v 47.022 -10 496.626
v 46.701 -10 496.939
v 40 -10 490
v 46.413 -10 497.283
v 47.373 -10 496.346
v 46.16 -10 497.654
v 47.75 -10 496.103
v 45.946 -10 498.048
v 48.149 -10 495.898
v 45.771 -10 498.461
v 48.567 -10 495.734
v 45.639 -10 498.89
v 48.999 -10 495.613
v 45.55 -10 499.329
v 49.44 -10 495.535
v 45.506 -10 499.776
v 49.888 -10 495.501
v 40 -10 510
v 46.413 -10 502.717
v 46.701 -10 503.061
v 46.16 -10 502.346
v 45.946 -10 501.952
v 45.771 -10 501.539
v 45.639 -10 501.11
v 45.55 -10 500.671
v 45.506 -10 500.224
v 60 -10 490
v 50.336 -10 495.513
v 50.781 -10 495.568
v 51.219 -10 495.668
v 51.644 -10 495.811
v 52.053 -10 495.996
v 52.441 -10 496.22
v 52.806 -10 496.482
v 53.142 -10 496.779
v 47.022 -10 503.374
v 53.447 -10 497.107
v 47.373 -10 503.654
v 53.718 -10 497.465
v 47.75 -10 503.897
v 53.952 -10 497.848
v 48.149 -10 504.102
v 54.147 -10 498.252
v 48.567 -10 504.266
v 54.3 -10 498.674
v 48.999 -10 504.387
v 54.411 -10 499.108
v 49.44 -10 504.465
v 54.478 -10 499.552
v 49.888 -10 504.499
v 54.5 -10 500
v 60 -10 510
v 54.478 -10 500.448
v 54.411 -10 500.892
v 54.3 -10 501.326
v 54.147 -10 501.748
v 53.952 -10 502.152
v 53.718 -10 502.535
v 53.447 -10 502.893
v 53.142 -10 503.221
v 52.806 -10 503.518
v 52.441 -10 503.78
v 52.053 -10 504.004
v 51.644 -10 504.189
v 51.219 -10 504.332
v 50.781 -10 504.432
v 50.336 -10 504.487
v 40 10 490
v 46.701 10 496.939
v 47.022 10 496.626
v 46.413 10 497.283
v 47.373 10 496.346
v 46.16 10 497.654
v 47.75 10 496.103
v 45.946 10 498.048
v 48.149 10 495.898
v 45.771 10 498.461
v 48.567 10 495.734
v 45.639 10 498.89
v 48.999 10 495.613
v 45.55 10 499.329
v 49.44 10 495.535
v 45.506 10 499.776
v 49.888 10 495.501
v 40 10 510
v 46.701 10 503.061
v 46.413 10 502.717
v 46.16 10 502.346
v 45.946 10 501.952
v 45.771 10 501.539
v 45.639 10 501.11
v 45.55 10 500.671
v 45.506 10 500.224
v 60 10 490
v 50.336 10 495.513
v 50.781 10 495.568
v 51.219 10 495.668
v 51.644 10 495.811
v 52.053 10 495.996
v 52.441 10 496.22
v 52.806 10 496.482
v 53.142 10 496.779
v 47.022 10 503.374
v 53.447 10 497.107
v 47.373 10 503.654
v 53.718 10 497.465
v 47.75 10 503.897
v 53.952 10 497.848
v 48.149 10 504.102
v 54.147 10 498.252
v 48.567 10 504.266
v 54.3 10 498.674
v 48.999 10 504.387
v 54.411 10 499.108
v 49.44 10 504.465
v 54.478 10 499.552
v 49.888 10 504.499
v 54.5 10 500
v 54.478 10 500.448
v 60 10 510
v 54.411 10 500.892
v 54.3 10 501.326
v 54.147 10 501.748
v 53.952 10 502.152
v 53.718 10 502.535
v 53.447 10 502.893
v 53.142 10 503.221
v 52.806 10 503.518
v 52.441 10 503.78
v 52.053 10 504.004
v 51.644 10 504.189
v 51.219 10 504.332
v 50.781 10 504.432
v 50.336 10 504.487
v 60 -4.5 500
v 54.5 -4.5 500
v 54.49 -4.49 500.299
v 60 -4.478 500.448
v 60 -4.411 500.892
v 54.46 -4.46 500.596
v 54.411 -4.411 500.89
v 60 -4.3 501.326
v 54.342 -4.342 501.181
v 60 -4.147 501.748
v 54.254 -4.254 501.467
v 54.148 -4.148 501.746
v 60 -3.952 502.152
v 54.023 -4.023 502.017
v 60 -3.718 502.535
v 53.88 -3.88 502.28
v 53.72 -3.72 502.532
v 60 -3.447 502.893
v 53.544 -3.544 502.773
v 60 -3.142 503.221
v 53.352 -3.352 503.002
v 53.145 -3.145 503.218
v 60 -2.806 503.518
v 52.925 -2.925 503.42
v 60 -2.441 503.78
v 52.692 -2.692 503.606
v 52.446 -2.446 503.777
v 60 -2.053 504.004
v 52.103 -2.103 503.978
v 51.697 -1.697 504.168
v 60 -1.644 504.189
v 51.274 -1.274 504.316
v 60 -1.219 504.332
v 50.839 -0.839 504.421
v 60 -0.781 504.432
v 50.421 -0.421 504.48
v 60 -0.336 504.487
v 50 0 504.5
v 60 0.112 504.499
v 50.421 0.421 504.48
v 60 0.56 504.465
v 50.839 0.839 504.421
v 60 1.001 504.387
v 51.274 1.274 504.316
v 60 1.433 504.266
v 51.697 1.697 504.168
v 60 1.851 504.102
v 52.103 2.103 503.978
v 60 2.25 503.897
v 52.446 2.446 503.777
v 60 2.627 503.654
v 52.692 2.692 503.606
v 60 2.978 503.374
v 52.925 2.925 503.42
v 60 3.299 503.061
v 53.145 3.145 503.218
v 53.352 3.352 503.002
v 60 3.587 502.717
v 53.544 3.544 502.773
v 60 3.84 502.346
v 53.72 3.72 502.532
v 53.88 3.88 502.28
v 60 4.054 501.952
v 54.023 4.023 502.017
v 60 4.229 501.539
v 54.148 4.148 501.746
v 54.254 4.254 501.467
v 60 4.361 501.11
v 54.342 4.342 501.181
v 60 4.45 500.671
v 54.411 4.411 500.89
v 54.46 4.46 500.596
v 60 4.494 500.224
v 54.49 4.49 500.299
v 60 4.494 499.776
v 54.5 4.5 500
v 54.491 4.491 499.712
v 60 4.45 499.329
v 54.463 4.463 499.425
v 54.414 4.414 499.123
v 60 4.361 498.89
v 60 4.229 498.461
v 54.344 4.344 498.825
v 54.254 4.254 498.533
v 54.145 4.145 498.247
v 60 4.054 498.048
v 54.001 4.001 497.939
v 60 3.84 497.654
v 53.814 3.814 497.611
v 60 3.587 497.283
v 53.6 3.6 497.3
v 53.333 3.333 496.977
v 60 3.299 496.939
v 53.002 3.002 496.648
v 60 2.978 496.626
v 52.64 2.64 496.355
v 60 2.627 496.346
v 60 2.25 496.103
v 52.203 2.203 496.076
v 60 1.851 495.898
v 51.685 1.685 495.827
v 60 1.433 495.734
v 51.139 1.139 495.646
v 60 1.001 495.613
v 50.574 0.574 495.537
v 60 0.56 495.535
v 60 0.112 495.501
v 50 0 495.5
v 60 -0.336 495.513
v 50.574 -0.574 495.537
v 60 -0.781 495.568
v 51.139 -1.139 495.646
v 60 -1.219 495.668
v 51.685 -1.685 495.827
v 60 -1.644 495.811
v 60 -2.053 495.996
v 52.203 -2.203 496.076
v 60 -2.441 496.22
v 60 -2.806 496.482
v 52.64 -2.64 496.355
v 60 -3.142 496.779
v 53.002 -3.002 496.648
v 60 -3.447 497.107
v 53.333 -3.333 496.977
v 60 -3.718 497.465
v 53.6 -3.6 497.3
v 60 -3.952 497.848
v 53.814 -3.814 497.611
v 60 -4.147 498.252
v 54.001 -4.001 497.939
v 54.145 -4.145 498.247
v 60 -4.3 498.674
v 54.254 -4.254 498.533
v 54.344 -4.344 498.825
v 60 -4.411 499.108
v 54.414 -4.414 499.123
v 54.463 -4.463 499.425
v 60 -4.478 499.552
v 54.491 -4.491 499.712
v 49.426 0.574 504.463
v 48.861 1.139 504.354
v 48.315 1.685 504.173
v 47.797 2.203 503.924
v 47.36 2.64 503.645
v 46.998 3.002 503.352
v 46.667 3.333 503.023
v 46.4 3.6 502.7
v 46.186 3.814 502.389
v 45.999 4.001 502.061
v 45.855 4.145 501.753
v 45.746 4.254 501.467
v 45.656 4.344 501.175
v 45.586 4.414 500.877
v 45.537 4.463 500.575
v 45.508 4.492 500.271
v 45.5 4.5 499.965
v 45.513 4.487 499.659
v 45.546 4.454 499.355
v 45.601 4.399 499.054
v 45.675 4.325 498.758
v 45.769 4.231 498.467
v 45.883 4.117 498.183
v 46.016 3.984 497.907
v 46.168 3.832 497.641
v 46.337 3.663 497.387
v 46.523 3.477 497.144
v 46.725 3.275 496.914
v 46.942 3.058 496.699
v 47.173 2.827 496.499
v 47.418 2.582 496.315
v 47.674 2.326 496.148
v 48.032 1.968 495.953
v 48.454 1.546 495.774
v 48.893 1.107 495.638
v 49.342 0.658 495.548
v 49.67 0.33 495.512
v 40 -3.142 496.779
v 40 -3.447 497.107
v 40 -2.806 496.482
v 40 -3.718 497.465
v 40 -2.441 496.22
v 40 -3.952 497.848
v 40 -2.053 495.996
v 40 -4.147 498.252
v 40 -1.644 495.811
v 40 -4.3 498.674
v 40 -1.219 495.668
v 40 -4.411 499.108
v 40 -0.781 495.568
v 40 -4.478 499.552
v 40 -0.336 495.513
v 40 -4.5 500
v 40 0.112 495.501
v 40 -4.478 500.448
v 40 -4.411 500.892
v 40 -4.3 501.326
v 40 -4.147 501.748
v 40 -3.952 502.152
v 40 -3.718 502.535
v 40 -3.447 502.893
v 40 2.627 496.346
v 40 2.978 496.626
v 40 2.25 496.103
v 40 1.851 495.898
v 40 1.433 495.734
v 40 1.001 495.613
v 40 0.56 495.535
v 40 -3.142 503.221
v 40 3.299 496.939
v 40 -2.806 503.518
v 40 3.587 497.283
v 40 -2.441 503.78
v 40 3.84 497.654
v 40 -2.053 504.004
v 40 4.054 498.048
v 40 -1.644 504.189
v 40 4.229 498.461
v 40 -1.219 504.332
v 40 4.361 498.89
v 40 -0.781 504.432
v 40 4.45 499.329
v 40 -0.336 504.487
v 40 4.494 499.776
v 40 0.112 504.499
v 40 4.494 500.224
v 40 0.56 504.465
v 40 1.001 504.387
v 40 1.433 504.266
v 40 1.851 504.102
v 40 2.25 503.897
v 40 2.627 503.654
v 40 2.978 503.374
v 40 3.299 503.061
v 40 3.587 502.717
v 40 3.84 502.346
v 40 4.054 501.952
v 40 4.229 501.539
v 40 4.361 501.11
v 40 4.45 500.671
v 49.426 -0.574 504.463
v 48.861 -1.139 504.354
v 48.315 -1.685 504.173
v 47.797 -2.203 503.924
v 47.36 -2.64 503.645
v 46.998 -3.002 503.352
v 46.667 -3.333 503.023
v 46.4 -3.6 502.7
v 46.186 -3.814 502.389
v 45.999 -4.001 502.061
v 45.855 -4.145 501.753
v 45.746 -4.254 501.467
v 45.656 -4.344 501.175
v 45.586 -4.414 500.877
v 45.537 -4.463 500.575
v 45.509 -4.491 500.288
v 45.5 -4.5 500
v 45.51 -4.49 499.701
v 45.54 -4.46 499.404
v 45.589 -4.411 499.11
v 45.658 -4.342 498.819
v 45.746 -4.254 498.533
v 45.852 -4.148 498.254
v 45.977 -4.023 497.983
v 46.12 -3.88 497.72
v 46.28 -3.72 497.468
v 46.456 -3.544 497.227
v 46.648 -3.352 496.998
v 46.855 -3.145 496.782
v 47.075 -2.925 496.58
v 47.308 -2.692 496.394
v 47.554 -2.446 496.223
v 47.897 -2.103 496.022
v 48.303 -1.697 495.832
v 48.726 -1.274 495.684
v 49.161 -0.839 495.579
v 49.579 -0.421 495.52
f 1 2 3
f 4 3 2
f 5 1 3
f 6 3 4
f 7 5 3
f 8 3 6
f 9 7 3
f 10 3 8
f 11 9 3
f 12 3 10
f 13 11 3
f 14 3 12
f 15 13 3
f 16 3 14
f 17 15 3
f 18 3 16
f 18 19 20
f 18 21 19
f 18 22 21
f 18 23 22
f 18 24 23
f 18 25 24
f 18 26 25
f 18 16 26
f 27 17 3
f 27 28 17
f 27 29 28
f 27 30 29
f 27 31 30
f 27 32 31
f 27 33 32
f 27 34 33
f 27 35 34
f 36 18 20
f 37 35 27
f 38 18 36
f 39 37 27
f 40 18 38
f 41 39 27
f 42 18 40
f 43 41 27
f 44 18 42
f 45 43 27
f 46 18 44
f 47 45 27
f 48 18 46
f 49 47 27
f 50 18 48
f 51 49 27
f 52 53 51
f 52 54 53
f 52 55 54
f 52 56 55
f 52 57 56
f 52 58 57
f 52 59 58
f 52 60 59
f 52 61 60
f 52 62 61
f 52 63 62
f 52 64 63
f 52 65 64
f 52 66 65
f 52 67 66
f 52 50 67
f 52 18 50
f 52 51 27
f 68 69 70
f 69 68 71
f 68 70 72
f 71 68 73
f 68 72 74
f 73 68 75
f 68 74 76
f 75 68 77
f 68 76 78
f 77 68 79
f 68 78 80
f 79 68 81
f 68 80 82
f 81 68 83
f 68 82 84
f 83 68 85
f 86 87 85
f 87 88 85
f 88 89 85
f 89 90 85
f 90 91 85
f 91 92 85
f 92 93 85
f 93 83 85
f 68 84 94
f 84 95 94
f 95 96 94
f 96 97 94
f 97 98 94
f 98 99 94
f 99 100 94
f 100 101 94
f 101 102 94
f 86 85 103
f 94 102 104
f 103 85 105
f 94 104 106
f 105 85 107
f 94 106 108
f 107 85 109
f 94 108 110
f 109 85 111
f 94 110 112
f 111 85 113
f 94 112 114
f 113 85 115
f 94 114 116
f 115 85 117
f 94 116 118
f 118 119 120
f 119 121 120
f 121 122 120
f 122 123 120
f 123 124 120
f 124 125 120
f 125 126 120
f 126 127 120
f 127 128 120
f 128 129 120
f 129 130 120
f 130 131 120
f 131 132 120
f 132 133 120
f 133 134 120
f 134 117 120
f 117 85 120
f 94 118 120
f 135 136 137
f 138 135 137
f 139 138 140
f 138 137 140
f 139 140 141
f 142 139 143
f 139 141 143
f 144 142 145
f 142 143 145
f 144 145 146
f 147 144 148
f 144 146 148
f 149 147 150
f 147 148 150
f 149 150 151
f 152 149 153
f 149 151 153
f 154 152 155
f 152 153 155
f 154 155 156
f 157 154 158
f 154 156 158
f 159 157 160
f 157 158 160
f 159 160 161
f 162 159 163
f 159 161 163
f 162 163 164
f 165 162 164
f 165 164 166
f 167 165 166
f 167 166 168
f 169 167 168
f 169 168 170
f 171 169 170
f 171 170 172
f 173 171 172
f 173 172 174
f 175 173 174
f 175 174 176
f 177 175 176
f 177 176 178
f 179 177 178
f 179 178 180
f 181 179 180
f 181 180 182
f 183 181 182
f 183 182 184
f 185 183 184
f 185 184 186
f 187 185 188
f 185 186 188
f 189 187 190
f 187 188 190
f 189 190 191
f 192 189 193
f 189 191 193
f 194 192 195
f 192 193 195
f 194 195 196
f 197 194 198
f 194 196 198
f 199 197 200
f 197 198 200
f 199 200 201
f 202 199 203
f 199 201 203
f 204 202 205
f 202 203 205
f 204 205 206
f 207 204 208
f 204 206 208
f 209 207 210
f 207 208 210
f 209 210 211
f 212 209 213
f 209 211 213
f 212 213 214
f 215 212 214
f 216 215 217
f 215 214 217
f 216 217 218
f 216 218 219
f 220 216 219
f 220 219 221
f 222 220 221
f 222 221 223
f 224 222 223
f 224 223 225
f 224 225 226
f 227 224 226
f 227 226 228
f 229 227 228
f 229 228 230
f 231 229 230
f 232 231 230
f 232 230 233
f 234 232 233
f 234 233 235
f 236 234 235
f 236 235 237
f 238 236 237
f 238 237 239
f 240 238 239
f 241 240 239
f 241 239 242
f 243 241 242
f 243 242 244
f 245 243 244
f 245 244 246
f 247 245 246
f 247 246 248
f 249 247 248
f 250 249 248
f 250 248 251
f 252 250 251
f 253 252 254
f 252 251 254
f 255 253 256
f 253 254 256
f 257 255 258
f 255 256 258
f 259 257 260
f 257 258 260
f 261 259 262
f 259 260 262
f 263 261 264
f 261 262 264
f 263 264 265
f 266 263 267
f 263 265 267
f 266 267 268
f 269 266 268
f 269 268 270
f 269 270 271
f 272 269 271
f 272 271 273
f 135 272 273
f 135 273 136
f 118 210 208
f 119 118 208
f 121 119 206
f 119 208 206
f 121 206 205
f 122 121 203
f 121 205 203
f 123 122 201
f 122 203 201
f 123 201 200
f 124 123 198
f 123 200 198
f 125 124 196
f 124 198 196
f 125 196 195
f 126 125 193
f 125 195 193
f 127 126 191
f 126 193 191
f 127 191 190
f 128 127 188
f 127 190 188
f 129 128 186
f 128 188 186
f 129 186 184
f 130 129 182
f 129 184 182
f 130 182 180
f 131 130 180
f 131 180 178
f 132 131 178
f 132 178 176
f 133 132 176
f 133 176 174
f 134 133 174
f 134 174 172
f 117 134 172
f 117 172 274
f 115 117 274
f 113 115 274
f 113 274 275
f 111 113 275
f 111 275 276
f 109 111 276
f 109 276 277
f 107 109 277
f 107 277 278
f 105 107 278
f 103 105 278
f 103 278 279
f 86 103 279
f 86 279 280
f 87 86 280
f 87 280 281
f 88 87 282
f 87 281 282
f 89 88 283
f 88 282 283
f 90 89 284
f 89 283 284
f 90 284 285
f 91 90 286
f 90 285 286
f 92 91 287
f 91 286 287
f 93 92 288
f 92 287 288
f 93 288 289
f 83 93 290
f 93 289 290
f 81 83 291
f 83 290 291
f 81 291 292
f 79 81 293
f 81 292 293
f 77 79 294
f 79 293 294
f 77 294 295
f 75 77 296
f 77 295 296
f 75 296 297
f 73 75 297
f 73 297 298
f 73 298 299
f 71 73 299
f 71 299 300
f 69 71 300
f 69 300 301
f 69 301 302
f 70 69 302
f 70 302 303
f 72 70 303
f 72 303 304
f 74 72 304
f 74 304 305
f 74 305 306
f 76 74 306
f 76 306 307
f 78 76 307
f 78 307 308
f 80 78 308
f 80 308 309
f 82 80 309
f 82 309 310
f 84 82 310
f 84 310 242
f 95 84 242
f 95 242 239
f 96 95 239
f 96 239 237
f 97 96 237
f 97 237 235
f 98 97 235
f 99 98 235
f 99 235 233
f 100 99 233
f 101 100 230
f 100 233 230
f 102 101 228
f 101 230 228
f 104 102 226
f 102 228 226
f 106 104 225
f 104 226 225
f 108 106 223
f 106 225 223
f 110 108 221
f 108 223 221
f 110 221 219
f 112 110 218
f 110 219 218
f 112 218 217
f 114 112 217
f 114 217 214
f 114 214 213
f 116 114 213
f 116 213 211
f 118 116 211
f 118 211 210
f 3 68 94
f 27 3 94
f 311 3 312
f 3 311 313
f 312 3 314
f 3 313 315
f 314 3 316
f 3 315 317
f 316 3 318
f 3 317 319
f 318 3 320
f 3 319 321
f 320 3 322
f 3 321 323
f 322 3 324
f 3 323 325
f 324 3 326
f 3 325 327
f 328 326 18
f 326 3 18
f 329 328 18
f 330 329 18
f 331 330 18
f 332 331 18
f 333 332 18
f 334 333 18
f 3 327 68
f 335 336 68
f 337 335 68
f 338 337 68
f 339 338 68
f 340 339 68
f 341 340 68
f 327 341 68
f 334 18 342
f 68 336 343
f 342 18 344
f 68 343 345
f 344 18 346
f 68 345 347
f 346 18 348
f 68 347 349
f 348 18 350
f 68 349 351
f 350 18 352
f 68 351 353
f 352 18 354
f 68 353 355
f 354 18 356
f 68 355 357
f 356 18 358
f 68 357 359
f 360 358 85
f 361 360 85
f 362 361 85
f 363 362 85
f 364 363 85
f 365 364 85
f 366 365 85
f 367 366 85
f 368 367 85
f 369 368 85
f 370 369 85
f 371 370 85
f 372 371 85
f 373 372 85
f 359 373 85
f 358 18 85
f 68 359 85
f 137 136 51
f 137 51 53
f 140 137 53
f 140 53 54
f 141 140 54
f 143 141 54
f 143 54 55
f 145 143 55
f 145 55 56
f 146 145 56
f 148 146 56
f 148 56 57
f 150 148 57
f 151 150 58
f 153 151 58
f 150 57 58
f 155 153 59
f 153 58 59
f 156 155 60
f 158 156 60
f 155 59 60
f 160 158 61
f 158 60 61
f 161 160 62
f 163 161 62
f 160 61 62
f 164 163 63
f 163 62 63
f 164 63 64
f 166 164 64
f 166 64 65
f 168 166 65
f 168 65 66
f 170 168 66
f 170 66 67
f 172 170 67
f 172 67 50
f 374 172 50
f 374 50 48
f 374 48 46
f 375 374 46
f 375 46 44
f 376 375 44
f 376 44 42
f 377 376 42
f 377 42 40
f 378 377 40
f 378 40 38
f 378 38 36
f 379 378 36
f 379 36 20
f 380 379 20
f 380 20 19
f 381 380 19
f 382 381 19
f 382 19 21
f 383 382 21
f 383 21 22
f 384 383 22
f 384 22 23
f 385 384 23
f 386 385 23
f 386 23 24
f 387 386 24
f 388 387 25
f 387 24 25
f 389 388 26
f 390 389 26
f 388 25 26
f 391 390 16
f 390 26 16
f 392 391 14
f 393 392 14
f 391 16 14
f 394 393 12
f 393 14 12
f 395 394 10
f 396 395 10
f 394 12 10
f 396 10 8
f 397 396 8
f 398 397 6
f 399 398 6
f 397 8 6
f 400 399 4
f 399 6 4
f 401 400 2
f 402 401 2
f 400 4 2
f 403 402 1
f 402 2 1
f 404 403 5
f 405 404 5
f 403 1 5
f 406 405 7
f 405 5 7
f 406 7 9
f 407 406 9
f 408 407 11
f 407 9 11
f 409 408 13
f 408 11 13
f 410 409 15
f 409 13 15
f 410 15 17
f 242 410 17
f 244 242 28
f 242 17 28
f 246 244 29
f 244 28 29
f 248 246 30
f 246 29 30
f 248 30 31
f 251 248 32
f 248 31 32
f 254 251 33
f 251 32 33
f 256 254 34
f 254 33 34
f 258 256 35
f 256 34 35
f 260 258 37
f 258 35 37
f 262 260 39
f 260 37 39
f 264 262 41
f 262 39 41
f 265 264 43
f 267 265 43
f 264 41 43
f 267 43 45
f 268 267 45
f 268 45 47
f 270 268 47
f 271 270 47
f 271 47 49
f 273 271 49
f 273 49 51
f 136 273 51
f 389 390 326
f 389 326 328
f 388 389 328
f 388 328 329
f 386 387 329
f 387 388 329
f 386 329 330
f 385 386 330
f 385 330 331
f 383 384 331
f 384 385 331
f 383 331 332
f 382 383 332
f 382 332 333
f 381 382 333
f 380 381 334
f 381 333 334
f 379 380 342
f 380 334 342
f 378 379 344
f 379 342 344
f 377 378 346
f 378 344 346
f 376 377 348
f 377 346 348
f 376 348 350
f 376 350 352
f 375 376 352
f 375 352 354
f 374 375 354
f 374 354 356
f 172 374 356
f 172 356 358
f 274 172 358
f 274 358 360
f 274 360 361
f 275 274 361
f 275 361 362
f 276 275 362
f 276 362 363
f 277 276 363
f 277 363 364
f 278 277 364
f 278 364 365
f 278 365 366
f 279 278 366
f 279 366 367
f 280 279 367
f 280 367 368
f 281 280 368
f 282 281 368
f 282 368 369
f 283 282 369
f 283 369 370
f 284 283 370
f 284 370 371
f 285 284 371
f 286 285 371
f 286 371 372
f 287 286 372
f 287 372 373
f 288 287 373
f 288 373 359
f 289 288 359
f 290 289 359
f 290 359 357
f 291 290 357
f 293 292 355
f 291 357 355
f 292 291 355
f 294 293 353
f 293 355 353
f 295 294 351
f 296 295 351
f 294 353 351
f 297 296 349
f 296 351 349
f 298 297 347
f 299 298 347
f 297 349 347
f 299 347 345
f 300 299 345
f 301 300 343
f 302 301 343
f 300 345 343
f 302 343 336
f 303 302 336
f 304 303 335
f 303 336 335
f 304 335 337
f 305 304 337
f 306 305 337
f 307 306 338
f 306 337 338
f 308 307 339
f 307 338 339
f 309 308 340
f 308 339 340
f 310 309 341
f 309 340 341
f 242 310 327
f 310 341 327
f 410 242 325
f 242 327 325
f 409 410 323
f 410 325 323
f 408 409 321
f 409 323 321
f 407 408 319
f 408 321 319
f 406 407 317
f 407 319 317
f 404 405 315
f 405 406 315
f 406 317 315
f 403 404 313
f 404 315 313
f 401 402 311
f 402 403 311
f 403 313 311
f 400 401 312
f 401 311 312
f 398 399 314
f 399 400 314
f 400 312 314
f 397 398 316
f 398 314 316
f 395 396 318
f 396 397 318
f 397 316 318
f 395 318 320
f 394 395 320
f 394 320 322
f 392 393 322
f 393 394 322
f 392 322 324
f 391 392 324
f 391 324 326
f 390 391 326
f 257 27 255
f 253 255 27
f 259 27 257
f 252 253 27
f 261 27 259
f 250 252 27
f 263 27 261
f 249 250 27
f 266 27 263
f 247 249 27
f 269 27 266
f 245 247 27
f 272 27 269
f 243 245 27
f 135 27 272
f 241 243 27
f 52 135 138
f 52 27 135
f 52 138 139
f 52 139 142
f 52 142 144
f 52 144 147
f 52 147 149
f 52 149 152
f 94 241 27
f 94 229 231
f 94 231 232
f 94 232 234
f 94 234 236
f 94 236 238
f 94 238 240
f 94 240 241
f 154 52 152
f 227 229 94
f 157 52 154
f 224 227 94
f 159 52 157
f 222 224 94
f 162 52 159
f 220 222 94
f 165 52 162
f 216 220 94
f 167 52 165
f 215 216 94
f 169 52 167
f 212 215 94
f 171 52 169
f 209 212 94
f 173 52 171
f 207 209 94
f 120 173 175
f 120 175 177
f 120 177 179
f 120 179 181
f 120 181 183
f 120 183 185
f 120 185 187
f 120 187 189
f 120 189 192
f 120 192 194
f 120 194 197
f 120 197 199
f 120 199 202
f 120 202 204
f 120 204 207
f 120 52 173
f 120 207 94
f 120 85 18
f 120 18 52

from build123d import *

# Parameters (mm, degrees)
SKETCH_W            = 20
SKETCH_H            = 20
PAD_DEPTH           = 10
HOLE_D              = 5
HOLE_DEPTH          = 25
HOLE_CBORE_D        = 9
HOLE_CBORE_DEPTH    = 20
HOLE001_D           = 5
HOLE001_DEPTH       = 25
HOLE001_CBORE_D     = 9
HOLE001_CBORE_DEPTH = 20


with BuildPart() as part:
    # Sketch → Pad (new body, symmetric)
    with BuildSketch(Plane.XY):
        Rectangle(SKETCH_W, SKETCH_H)
    extrude(amount=PAD_DEPTH, both=True)

    # Hole
    with Locations(Plane.XZ.offset(10)):
        with Locations((0, 0)):
            CounterBoreHole(HOLE_D / 2, HOLE_CBORE_D / 2, HOLE_CBORE_DEPTH, depth=HOLE_DEPTH)

    # Hole001
    with Locations(Plane(origin=(-10, 0, 0), x_dir=(0, -1, 0), z_dir=(-1, 0, 0))):
        with Locations((0, 0)):
            CounterBoreHole(HOLE001_D / 2, HOLE001_CBORE_D / 2, HOLE001_CBORE_DEPTH, depth=HOLE001_DEPTH)


with BuildPart() as part_1:
    # Body placement: moved
    add(part.part.moved(Location((50, 0, 500))))


solid = part_1.part
